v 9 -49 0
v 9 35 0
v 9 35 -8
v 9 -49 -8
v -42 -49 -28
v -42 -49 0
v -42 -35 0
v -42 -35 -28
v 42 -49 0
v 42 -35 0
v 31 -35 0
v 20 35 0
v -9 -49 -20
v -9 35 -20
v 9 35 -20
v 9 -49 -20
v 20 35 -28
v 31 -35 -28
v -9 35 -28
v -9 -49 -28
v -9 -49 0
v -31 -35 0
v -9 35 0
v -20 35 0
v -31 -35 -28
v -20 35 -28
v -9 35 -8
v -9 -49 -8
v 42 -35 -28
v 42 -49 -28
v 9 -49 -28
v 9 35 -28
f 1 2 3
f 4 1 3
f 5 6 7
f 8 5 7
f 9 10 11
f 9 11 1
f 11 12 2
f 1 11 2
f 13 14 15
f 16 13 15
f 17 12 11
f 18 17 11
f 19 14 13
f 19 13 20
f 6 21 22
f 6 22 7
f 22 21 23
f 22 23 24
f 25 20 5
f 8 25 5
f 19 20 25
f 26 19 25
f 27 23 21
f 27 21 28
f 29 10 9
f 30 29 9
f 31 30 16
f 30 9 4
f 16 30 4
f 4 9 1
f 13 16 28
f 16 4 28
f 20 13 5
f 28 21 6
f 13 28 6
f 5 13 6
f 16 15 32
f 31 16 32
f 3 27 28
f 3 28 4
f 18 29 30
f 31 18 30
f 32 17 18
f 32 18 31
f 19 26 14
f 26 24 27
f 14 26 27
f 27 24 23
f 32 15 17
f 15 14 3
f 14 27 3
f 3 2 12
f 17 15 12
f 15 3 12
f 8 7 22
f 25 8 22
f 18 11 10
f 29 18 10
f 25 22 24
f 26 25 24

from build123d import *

# Parameters (mm, degrees)
SALIENTE_EXTRUIR1_DEPTH = 28
CROQUIS2_W              = 18
CROQUIS2_H              = 8
CORTAR_EXTRUIR1_DEPTH   = 99


with BuildPart() as part:
    # Croquis1 → Saliente-Extruir1 (new body)
    with BuildSketch(Plane.XY):
        Polygon((-20, 35), (20, 35), (31, -35), (42, -35), (42, -49), (-42, -49), (-42, -35), (-31, -35), align=None)
    extrude(amount=-SALIENTE_EXTRUIR1_DEPTH)

    # Croquis2 → Cortar-Extruir1 (cut, through all)
    with BuildSketch(Plane(origin=(0, 35, 0), x_dir=(1, 0, 0), z_dir=(0, 1, 0))):
        with Locations((0, 4)):
            Rectangle(CROQUIS2_W, CROQUIS2_H)
        with Locations((0, 24)):
            Rectangle(CROQUIS2_W, CROQUIS2_H)
    extrude(amount=-CORTAR_EXTRUIR1_DEPTH, mode=Mode.SUBTRACT)


solid = part.part
